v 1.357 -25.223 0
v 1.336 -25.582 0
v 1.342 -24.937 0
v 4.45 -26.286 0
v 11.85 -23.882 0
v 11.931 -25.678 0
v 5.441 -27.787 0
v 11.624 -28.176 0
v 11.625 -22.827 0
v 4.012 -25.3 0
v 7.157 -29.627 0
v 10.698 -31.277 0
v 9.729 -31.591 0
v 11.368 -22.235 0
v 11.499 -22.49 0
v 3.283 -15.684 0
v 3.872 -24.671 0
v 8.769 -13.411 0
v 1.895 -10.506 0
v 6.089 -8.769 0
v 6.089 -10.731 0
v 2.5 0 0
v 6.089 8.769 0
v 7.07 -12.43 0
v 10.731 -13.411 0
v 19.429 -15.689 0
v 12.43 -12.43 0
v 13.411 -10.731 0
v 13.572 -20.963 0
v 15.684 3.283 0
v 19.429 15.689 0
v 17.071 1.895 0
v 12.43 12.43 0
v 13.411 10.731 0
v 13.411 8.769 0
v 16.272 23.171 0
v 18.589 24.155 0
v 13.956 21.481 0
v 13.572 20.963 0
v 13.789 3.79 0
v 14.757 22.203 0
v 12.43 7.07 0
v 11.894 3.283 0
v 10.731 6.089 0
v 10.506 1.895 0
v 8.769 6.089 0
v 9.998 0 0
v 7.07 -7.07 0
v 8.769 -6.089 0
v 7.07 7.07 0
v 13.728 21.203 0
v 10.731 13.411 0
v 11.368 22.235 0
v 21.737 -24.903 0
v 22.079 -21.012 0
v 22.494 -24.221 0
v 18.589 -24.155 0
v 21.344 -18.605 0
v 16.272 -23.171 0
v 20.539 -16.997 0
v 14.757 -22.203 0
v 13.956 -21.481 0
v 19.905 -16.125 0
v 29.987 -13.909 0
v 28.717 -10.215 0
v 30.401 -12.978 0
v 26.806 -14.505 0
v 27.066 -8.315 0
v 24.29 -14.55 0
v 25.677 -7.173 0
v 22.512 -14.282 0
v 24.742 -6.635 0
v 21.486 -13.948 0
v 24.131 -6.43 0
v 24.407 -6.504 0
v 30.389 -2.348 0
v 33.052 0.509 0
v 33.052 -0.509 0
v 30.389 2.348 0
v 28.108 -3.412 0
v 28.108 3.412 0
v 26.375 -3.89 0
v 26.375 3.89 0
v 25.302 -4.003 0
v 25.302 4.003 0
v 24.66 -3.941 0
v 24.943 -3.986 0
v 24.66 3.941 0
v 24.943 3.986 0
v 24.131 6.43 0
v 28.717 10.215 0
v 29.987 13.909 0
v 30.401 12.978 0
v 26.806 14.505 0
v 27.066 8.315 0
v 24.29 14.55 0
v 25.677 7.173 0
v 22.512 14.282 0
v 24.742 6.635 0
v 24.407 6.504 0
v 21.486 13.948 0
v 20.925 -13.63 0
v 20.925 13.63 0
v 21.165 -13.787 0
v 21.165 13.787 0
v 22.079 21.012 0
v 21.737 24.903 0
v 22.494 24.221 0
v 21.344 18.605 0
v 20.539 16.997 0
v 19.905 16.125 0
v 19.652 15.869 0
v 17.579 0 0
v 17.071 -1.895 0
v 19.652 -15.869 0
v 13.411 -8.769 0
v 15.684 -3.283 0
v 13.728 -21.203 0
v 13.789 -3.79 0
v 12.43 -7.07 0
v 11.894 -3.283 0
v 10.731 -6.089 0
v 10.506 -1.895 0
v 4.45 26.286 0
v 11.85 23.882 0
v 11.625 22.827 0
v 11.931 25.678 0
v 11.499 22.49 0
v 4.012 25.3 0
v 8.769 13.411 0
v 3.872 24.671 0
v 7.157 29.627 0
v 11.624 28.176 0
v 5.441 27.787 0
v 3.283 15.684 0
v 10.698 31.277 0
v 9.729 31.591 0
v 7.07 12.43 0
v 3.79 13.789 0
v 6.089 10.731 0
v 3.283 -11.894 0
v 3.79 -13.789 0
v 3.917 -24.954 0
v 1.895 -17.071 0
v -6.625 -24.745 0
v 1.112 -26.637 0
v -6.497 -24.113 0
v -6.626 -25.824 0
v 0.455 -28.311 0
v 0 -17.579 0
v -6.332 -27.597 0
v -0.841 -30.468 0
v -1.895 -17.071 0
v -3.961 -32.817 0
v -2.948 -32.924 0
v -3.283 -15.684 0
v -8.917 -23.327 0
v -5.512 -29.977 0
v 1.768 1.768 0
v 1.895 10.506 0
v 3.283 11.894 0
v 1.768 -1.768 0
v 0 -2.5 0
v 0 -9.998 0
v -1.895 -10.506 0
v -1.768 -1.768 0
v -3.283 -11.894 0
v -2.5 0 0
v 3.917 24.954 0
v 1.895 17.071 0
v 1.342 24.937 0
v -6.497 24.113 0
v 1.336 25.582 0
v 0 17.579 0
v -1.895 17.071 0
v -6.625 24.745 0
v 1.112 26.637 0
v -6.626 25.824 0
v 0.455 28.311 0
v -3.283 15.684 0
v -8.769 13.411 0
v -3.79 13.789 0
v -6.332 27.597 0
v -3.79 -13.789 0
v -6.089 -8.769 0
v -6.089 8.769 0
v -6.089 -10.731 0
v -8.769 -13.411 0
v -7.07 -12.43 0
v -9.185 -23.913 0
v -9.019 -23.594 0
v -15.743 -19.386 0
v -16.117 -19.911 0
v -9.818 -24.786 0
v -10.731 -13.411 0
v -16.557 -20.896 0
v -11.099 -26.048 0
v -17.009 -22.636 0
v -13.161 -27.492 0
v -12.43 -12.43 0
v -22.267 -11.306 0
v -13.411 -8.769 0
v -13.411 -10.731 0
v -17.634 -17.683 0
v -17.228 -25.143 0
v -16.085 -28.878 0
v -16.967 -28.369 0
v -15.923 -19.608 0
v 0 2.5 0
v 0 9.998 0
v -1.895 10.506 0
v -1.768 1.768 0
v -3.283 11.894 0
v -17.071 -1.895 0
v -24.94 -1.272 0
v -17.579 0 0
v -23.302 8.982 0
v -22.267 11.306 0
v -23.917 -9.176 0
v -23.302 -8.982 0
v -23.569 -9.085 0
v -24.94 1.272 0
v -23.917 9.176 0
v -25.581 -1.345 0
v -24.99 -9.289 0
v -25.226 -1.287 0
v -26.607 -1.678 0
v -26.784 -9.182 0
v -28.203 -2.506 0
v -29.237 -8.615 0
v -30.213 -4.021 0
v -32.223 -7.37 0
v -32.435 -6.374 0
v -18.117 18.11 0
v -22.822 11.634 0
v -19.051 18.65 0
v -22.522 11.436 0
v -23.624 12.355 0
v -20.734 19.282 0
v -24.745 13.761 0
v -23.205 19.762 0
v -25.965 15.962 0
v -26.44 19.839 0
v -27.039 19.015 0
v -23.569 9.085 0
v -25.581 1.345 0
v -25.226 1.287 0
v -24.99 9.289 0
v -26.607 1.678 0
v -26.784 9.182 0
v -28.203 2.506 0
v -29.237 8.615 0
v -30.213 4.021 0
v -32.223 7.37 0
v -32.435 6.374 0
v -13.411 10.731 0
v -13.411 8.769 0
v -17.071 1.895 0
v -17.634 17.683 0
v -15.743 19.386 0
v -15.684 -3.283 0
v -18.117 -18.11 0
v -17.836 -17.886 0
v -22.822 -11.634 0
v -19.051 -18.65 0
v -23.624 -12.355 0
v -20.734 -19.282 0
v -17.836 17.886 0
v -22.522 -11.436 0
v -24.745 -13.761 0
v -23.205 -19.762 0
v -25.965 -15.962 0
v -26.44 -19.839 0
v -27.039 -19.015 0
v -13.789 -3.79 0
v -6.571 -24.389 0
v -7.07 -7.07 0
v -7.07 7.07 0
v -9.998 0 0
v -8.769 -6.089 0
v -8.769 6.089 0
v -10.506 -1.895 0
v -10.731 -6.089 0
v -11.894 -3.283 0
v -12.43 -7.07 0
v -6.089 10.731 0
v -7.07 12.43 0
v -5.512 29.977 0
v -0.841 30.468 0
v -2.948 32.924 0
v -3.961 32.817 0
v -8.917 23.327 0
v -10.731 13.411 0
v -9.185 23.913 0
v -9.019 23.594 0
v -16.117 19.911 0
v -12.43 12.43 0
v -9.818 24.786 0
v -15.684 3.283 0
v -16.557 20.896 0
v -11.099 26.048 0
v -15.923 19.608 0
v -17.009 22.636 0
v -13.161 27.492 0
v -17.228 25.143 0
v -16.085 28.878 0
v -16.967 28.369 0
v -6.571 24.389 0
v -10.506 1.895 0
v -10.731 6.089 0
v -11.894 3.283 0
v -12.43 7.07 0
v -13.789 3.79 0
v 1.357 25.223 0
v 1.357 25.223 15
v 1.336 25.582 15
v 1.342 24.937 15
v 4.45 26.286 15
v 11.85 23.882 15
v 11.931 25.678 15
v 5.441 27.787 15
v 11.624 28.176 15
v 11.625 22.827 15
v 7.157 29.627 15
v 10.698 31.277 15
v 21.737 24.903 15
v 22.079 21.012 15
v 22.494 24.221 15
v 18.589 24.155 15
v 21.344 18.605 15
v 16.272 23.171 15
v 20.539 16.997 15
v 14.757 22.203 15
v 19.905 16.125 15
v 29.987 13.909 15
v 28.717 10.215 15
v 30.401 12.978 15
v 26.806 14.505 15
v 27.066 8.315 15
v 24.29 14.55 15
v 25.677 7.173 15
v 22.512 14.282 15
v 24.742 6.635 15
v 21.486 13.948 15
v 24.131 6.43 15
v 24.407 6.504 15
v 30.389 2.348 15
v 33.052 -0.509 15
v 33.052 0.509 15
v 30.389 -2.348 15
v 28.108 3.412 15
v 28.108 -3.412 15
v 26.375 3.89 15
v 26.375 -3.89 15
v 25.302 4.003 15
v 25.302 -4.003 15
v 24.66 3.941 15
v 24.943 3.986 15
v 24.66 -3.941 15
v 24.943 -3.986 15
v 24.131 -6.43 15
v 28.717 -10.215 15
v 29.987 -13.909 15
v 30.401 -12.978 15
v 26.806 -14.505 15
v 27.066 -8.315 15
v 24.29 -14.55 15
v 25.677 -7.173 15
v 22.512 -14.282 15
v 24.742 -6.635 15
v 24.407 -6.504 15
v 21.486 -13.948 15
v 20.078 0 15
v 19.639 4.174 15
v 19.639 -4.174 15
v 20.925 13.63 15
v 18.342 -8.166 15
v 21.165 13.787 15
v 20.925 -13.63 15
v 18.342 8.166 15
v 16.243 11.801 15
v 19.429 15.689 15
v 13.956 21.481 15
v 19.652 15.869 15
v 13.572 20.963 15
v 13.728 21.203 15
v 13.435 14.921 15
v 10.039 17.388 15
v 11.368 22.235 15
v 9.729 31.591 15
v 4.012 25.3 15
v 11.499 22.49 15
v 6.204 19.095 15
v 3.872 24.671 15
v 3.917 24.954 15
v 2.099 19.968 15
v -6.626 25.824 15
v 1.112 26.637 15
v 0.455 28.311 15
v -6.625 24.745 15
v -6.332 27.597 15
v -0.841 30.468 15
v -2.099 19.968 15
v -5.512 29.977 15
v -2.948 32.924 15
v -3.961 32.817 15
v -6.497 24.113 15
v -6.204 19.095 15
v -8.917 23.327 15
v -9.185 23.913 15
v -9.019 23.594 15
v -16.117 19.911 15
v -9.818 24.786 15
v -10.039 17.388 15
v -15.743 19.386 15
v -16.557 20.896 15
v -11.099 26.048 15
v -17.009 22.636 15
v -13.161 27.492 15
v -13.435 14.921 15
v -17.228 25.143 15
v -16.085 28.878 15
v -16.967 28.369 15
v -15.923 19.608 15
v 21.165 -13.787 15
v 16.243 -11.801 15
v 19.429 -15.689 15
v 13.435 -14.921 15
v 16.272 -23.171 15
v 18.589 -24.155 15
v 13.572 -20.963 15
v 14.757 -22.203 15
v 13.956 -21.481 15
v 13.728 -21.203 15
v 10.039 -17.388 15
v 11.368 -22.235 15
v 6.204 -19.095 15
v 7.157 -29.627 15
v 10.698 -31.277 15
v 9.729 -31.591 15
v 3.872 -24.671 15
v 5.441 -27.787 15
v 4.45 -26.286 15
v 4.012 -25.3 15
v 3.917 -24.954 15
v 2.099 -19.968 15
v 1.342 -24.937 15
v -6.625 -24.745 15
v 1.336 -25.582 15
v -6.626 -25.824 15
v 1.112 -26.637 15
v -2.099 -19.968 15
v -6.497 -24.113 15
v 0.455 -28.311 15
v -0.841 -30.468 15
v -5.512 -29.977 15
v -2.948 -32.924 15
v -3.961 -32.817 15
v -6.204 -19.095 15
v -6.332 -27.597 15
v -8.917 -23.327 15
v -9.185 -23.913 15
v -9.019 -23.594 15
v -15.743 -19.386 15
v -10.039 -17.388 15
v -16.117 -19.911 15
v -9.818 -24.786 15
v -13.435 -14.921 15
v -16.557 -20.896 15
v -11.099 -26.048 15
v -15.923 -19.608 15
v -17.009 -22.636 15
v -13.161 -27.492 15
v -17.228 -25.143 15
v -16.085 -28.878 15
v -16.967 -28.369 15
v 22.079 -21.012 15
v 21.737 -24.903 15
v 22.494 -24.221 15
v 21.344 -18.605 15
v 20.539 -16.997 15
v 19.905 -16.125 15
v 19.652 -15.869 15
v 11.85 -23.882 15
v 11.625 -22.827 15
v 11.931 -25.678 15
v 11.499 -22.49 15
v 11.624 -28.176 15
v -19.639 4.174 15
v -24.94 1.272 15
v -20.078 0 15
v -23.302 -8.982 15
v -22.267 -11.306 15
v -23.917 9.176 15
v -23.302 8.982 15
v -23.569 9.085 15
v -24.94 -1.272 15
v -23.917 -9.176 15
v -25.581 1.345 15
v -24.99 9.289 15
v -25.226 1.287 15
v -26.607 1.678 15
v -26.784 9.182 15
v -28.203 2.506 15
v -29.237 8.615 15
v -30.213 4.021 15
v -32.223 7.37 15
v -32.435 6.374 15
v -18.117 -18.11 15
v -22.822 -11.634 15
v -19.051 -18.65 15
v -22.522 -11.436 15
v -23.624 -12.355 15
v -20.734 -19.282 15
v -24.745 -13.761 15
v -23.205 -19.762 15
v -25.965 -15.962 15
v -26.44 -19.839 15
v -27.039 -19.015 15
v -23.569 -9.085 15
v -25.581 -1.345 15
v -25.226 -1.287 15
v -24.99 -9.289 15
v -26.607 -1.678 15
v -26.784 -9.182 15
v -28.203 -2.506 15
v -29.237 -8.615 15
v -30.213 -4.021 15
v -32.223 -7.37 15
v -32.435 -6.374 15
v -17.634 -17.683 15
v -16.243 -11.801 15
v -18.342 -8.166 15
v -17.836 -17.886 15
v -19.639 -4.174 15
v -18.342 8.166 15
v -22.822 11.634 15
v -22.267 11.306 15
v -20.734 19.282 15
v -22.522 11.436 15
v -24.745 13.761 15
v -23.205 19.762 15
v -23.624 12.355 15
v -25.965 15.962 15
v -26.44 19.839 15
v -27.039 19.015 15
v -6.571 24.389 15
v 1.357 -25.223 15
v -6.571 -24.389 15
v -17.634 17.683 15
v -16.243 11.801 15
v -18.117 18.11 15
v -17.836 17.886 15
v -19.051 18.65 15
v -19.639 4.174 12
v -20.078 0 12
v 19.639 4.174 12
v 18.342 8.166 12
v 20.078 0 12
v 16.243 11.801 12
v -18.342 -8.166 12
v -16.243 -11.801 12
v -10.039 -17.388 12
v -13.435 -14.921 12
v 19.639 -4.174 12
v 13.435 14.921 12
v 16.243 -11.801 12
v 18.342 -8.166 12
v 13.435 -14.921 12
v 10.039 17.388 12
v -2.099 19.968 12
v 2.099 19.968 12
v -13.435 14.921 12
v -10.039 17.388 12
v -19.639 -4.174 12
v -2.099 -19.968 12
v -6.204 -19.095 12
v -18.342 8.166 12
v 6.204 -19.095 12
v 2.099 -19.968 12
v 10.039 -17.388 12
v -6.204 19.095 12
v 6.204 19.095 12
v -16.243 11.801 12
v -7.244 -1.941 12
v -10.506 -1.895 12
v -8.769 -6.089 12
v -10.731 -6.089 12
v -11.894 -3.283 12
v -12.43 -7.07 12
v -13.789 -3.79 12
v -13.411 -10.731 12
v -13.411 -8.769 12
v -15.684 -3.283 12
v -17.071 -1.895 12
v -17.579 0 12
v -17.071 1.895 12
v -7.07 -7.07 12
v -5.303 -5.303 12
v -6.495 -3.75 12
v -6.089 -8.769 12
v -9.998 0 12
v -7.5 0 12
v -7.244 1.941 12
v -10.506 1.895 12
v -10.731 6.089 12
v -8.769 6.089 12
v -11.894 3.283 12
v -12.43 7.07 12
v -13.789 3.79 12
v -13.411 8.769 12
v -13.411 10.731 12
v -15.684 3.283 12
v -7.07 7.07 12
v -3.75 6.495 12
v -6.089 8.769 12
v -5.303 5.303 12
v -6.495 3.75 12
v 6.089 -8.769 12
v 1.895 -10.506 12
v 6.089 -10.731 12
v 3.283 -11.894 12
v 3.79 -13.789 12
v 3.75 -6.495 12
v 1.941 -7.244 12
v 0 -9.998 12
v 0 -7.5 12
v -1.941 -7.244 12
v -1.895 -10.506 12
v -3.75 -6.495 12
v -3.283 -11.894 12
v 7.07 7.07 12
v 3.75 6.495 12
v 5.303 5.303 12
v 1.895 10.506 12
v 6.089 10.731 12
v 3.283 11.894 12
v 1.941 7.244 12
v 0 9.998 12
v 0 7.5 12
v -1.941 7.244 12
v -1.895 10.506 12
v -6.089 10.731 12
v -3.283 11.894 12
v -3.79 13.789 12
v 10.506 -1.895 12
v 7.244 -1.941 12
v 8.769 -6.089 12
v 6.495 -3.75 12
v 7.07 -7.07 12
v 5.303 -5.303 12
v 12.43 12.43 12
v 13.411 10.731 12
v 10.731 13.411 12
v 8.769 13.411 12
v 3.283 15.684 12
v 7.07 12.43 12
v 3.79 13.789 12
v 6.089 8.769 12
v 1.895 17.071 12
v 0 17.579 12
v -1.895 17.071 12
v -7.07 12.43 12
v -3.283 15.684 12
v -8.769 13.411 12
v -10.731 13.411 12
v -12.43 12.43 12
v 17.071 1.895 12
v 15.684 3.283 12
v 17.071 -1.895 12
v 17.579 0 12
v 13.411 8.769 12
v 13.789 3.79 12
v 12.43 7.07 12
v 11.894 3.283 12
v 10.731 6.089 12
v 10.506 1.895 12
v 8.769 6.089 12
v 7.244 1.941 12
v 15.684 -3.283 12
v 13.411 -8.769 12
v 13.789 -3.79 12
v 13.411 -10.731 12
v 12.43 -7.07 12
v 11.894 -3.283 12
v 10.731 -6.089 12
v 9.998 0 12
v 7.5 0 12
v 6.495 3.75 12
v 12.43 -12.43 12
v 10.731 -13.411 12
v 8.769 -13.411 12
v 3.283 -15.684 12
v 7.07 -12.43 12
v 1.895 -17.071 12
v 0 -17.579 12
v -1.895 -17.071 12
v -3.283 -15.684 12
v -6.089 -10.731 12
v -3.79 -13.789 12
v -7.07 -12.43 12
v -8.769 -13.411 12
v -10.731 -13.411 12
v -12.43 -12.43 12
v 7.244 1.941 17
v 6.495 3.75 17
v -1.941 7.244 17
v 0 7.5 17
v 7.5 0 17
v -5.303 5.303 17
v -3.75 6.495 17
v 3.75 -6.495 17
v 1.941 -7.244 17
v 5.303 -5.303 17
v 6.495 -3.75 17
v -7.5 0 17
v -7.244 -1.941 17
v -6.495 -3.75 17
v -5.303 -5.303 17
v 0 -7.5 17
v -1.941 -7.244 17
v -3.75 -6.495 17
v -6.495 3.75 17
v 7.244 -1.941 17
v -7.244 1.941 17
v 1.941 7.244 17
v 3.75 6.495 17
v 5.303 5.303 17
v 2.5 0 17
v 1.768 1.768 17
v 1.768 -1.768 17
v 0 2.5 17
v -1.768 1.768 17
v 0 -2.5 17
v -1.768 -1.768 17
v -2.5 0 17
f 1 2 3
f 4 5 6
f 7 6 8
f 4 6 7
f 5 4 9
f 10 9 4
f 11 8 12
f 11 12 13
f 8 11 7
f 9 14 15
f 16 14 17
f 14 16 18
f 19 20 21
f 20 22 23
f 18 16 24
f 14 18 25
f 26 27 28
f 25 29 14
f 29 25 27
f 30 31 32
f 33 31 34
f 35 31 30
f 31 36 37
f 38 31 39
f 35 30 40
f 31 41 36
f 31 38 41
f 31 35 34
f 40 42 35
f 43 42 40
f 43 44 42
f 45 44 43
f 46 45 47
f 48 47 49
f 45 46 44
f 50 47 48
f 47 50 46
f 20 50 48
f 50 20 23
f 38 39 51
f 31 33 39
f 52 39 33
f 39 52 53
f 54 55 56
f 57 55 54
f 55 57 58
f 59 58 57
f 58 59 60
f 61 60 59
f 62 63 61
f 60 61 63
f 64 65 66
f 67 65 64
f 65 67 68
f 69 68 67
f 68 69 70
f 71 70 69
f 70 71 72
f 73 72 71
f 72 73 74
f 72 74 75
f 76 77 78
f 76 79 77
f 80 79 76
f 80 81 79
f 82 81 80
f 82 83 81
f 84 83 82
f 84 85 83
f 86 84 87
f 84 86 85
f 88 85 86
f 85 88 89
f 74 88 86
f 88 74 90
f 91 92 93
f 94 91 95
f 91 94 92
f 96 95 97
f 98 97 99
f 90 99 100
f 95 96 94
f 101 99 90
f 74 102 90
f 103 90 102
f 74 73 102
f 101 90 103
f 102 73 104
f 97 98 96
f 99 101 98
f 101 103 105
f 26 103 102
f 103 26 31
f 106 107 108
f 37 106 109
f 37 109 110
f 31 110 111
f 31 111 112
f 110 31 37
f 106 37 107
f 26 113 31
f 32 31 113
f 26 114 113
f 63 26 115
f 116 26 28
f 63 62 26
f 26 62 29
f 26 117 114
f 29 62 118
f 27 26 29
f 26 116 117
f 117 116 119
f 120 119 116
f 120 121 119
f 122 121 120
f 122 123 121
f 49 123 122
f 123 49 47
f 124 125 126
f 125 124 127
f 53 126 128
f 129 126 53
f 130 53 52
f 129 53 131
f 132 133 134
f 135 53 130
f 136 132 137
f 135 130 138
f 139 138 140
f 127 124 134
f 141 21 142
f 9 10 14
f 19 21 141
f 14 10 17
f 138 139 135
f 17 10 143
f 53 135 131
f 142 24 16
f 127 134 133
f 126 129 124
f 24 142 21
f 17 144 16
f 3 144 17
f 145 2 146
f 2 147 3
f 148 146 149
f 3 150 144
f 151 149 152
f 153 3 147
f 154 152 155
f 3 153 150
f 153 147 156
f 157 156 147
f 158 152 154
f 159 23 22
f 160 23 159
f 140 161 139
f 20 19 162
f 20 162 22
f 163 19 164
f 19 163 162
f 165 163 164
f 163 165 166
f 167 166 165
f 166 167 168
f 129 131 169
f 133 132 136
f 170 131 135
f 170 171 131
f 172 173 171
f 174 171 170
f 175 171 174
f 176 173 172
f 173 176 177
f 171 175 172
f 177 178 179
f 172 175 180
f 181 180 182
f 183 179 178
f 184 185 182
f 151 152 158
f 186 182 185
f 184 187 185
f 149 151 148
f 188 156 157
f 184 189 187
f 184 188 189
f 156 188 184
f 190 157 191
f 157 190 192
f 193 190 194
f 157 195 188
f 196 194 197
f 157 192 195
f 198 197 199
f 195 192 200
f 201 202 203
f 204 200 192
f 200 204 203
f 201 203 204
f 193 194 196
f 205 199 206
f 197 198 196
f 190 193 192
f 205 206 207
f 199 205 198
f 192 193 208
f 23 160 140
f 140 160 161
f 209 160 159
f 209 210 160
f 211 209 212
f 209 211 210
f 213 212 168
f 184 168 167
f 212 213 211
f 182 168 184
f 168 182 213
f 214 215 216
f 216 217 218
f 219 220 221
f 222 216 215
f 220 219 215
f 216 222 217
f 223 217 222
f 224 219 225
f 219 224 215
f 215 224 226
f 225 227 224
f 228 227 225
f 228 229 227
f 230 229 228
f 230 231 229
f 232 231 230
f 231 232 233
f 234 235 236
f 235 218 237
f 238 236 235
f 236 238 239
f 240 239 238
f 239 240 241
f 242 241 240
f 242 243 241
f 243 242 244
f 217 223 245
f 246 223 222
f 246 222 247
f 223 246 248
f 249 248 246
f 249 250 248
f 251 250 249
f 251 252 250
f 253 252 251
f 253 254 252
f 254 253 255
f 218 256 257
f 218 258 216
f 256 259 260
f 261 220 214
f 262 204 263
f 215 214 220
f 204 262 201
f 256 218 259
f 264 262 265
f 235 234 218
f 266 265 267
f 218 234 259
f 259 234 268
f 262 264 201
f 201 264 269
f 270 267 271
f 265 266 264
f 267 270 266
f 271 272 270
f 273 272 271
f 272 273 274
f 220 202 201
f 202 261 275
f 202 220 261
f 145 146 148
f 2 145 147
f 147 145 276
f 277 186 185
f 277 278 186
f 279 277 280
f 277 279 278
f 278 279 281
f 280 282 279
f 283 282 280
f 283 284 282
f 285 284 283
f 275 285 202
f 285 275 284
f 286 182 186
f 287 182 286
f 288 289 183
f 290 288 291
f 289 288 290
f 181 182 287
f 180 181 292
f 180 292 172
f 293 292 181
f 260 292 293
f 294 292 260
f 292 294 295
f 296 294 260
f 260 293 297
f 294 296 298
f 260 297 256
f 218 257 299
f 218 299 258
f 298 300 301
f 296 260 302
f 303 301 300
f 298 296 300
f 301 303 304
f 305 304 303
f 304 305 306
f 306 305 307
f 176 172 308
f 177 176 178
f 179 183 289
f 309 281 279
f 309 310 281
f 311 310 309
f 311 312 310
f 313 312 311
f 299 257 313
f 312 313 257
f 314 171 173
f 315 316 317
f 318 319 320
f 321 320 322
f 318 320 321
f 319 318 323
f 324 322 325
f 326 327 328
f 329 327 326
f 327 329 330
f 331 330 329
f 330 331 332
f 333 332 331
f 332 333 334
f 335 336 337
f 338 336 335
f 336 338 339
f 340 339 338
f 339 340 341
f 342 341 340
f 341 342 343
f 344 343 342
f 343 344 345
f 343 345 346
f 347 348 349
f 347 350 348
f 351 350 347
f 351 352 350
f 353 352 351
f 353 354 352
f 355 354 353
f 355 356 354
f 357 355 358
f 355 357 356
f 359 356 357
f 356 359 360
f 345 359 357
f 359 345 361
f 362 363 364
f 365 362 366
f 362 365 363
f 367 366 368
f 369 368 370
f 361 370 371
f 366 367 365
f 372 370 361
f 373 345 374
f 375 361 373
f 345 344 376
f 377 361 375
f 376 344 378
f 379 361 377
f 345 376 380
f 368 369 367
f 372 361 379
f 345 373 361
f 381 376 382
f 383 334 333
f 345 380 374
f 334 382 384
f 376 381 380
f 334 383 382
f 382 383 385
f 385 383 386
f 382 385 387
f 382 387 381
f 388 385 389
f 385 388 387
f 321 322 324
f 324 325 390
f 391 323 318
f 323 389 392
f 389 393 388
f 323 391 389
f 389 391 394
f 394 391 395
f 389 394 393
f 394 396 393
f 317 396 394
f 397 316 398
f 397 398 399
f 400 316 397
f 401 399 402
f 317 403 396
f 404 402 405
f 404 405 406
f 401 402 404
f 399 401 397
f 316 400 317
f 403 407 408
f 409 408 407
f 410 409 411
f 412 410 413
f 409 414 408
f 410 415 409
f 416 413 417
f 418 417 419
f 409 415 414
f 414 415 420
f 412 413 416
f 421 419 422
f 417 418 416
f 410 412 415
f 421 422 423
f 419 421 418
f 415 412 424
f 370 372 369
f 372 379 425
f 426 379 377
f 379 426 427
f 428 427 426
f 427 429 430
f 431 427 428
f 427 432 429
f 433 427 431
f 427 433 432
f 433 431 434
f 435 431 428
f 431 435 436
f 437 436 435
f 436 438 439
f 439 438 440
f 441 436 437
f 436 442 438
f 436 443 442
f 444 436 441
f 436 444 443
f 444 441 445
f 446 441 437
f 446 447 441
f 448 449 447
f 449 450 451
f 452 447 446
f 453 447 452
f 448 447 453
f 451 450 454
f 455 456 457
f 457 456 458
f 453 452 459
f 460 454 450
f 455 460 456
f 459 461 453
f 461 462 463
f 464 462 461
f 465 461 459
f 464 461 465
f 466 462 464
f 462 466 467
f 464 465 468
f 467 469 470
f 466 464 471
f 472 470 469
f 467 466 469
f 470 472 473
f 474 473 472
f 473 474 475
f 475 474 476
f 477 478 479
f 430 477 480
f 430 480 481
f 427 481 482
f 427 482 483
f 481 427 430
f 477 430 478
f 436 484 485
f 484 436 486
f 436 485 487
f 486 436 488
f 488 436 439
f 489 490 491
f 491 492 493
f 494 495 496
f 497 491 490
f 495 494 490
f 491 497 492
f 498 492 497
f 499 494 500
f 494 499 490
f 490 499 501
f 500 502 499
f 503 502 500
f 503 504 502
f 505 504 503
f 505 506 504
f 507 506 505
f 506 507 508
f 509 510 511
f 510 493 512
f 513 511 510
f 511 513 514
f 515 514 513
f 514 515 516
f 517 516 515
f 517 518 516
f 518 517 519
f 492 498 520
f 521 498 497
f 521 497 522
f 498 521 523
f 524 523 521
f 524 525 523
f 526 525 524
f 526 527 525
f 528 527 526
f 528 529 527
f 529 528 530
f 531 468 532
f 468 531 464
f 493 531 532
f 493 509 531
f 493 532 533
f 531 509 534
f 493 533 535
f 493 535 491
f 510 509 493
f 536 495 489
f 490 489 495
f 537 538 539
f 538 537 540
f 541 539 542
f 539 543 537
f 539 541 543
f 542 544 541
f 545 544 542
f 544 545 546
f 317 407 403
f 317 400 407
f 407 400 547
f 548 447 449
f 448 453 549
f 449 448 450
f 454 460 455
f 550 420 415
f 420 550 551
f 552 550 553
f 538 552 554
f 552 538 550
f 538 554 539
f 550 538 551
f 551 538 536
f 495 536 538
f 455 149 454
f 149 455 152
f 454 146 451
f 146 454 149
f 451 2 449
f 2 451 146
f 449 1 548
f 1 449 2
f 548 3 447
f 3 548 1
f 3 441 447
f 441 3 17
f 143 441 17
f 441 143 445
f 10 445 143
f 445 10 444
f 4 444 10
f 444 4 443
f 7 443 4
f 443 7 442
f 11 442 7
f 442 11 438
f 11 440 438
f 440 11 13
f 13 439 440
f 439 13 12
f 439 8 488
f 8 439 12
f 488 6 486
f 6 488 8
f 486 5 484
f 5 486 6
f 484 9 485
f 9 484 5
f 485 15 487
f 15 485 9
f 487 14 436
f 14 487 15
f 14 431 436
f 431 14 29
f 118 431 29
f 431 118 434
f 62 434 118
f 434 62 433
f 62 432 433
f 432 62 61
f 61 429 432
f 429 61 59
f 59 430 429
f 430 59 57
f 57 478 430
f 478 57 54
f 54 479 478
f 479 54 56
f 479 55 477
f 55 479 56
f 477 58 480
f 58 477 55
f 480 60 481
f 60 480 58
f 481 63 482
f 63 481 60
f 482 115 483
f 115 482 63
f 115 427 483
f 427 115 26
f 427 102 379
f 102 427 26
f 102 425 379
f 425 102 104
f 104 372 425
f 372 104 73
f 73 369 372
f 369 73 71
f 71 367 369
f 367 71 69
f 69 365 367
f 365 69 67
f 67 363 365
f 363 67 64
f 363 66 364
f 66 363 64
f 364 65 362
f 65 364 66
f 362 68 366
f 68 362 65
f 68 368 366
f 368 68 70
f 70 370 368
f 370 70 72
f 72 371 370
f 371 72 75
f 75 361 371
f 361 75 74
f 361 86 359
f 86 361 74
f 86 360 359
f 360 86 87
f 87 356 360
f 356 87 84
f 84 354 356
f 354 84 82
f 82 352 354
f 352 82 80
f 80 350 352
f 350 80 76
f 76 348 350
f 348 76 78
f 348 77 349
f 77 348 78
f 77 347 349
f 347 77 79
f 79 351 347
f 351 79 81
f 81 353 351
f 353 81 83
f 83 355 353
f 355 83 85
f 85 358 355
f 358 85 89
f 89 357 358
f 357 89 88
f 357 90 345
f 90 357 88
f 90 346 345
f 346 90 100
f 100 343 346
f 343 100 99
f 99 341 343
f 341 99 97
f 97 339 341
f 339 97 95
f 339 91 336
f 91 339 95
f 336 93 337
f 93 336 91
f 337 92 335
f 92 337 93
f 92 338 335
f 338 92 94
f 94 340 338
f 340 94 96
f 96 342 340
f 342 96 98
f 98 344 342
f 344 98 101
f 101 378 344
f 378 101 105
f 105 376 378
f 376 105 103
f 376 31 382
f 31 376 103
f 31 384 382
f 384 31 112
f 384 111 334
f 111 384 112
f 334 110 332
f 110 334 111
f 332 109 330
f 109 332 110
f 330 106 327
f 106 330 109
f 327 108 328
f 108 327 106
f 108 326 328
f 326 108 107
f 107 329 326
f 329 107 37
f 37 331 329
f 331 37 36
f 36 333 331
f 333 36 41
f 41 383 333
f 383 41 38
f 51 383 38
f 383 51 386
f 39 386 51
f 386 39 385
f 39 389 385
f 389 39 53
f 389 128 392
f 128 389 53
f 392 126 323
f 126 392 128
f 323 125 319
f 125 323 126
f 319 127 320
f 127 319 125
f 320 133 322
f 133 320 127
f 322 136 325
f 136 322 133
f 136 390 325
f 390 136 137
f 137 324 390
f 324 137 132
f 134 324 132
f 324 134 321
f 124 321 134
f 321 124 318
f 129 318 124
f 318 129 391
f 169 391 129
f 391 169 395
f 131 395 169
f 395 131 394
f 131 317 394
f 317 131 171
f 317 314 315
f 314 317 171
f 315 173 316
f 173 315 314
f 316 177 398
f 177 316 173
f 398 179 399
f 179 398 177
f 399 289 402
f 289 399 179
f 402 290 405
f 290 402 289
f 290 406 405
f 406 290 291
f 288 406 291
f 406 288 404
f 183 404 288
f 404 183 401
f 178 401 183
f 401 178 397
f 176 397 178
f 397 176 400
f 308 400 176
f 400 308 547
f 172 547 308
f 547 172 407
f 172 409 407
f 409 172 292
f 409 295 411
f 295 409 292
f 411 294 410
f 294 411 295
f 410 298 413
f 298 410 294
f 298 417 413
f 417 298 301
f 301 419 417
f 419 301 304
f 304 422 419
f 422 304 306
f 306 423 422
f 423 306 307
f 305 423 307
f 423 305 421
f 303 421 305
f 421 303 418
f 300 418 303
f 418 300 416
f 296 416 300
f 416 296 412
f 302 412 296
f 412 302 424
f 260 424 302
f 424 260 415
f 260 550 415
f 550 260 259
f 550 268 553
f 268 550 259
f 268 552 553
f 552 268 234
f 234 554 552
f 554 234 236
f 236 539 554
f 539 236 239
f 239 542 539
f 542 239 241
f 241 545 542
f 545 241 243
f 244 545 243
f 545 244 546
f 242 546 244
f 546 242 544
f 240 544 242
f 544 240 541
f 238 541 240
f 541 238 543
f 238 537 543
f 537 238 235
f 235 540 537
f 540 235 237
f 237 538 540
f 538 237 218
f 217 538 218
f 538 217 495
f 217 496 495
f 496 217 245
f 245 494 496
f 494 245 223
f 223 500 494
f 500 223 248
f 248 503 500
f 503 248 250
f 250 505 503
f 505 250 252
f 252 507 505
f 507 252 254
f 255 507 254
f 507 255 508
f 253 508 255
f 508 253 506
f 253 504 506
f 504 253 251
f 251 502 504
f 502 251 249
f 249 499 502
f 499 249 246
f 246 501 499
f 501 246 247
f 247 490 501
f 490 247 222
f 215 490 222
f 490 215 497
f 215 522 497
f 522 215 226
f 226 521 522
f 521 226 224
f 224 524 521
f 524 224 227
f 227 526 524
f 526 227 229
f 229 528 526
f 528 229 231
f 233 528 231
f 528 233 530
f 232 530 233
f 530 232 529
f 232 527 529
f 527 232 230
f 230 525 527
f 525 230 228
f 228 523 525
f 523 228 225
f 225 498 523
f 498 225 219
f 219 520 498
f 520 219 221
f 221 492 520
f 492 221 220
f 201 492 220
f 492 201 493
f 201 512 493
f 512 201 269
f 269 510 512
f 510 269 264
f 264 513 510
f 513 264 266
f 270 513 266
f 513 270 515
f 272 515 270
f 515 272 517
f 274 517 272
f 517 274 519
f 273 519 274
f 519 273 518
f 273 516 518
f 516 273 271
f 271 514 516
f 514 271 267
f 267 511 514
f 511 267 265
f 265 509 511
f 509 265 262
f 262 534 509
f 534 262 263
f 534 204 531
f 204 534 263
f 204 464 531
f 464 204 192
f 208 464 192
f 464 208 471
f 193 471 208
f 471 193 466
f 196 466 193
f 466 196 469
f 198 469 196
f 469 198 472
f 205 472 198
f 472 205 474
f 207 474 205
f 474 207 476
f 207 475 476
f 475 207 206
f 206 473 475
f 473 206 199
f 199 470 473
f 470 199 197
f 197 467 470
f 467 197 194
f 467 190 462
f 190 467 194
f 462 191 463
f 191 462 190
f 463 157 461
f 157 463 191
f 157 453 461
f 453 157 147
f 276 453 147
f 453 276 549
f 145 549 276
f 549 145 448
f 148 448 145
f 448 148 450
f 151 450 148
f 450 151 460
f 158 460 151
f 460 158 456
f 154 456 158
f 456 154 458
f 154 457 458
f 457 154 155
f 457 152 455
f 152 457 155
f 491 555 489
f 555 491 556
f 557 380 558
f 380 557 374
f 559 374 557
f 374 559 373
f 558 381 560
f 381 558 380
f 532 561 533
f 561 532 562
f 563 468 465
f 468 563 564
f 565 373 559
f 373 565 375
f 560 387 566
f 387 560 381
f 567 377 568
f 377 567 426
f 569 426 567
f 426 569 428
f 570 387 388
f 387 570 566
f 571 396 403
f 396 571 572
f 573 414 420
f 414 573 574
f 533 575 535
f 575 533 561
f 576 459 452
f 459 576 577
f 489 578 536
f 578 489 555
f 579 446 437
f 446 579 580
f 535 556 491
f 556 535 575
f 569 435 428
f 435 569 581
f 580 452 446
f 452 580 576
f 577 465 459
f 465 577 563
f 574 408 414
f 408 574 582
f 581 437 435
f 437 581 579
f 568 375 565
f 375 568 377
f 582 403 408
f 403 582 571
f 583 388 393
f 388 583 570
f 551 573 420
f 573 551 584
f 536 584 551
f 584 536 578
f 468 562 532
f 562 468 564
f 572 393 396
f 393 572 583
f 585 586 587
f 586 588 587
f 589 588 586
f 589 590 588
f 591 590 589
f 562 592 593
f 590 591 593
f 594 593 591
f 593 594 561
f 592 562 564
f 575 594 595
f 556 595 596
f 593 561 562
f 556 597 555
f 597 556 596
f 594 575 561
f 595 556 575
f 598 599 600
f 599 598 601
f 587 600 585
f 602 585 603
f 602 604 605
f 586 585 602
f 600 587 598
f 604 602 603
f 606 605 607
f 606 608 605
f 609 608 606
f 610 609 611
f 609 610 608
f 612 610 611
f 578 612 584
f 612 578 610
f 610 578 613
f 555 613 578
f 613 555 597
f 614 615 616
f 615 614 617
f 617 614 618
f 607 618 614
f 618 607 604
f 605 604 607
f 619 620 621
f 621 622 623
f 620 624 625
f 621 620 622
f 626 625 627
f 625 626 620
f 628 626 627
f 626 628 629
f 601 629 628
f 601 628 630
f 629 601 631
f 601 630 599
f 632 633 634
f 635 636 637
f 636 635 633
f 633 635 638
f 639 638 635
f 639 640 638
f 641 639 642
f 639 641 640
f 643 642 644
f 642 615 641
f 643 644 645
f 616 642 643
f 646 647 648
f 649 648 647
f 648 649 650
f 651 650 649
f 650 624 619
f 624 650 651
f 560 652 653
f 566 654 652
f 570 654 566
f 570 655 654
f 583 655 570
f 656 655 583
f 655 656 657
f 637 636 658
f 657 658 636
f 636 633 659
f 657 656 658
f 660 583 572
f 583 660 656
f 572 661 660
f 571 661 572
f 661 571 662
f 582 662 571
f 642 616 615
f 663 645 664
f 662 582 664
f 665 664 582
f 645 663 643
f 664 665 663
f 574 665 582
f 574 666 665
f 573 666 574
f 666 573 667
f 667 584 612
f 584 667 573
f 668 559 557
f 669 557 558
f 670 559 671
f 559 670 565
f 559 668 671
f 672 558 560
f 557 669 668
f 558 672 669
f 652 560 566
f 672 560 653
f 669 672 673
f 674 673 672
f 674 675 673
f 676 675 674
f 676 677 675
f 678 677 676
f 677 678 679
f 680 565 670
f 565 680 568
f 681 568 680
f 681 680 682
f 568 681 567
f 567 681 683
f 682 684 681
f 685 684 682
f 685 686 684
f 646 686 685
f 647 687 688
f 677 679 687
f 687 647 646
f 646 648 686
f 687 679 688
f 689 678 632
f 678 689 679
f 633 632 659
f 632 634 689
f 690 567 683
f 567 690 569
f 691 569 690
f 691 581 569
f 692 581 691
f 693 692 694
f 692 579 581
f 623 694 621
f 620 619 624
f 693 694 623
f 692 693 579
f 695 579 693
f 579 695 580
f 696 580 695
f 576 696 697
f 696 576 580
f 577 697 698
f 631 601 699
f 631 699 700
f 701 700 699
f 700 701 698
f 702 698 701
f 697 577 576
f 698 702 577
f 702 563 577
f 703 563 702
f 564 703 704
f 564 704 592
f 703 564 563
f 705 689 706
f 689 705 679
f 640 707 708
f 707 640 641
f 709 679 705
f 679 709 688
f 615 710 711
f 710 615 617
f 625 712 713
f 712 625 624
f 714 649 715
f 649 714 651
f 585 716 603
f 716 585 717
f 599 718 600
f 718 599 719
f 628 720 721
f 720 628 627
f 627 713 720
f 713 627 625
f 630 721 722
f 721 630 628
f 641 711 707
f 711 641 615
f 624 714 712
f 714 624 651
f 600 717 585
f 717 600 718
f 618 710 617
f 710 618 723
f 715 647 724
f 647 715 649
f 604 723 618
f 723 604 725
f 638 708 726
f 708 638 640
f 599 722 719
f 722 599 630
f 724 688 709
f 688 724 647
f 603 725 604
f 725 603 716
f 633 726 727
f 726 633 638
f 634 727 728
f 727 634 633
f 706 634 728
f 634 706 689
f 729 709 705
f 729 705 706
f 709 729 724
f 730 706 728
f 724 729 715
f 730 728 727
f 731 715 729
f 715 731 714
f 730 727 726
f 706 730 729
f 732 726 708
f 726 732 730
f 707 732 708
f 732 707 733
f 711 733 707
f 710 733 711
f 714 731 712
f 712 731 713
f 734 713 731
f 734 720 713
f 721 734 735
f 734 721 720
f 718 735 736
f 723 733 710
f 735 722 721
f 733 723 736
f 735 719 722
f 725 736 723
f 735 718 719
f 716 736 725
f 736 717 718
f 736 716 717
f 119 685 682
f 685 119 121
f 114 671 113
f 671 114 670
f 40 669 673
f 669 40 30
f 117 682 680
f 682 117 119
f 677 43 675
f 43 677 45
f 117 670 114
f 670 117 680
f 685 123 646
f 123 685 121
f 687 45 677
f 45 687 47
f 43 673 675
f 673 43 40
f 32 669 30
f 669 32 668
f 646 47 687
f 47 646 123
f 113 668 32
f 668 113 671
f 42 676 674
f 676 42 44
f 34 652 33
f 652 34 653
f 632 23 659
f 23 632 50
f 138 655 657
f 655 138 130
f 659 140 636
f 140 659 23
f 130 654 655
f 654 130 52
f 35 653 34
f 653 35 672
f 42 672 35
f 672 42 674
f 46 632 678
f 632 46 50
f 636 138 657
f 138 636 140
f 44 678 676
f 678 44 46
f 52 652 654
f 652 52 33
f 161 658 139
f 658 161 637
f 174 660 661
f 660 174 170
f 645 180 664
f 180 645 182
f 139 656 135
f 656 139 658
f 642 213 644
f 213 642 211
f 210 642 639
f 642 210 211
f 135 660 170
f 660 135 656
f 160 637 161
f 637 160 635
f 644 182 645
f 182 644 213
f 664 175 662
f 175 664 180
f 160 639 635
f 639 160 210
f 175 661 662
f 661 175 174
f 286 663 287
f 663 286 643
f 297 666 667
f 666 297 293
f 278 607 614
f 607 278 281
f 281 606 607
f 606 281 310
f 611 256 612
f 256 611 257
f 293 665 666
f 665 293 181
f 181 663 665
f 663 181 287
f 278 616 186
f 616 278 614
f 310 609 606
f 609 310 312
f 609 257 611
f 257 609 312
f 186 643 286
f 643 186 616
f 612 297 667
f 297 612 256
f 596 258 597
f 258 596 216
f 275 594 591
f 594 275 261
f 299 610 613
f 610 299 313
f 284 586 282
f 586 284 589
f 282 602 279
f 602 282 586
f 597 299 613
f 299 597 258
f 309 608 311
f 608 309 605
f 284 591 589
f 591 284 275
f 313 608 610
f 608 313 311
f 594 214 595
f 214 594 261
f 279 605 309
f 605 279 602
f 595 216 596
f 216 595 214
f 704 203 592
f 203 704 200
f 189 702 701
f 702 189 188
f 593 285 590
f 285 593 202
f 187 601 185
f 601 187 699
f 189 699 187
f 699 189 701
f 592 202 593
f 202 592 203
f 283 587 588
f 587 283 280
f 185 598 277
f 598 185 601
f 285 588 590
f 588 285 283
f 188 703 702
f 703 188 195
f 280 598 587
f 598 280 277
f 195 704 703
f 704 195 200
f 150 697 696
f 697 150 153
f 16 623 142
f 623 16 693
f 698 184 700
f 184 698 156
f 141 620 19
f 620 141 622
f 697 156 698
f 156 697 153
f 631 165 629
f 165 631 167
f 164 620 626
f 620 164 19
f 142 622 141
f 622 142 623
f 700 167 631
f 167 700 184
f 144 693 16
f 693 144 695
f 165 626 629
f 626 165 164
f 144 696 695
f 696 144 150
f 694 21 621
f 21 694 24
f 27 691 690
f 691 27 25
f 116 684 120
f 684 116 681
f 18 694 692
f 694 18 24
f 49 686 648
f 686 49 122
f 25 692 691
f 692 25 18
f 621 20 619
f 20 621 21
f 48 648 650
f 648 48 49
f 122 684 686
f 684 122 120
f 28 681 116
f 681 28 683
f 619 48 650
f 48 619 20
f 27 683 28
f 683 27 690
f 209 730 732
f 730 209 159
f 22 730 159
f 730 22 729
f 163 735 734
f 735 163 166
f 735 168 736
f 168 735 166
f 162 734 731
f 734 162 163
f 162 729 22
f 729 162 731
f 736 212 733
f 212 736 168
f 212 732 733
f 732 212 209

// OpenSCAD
// Parametric Involute Bevel and Spur Gears by GregFrost
// It is licensed under the Creative Commons - GNU LGPL 2.1 license.
// © 2010 by GregFrost, thingiverse.com/Amp
//  and http://www.thingiverse.com/thing:3752

// thickness => épaisseur
// pitch => pas
// rim => jante
// bore => perçage

// Simple Test:
gear (circular_pitch=700,
    number_of_teeth=15,
    pressure_angle=30,
    clearance=0.2,
	gear_thickness = 12,
	rim_thickness = 15,
	hub_thickness = 17,
	circles=8);

//Complex Spur Gear Test:
//test_gears ();

// Meshing Double Helix:
//test_meshing_double_helix ();

module test_meshing_double_helix(){
    meshing_double_helix ();
}

// Demonstrate the backlash option for Spur gears.
//test_backlash ();

// Demonstrate how to make meshing bevel gears.
//test_bevel_gear_pair();

module test_bevel_gear_pair(){
    bevel_gear_pair ();
}

module test_bevel_gear(){bevel_gear();}

//bevel_gear();

pi=3.1415926535897932384626433832795;

//==================================================
// Bevel Gears:
// Two gears with the same cone distance, circular pitch (measured at the cone distance)
// and pressure angle will mesh.

module bevel_gear_pair (
	gear1_teeth = 41,
	gear2_teeth = 7,
	axis_angle = 90,
	outside_circular_pitch=1000)
{
	outside_pitch_radius1 = gear1_teeth * outside_circular_pitch / 360;
	outside_pitch_radius2 = gear2_teeth * outside_circular_pitch / 360;
	pitch_apex1=outside_pitch_radius2 * sin (axis_angle) +
		(outside_pitch_radius2 * cos (axis_angle) + outside_pitch_radius1) / tan (axis_angle);
	cone_distance = sqrt (pow (pitch_apex1, 2) + pow (outside_pitch_radius1, 2));
	pitch_apex2 = sqrt (pow (cone_distance, 2) - pow (outside_pitch_radius2, 2));
	echo ("cone_distance", cone_distance);
	pitch_angle1 = asin (outside_pitch_radius1 / cone_distance);
	pitch_angle2 = asin (outside_pitch_radius2 / cone_distance);
	echo ("pitch_angle1, pitch_angle2", pitch_angle1, pitch_angle2);
	echo ("pitch_angle1 + pitch_angle2", pitch_angle1 + pitch_angle2);

	rotate([0,0,90])
	translate ([0,0,pitch_apex1+20])
	{
		translate([0,0,-pitch_apex1])
		bevel_gear (
			number_of_teeth=gear1_teeth,
			cone_distance=cone_distance,
			pressure_angle=30,
			outside_circular_pitch=outside_circular_pitch);

		rotate([0,-(pitch_angle1+pitch_angle2),0])
		translate([0,0,-pitch_apex2])
		bevel_gear (
			number_of_teeth=gear2_teeth,
			cone_distance=cone_distance,
			pressure_angle=30,
			outside_circular_pitch=outside_circular_pitch);
	}
}

//Bevel Gear Finishing Options:
bevel_gear_flat = 0;
bevel_gear_back_cone = 1;

module bevel_gear (
	number_of_teeth=11,
	cone_distance=100,
	face_width=20,
	outside_circular_pitch=1000,
	pressure_angle=30,
	clearance = 0.2,
	bore_diameter=5,
	gear_thickness = 15,
	backlash = 0,
	involute_facets=0,
	finish = -1)
{
	echo ("bevel_gear",
		"teeth", number_of_teeth,
		"cone distance", cone_distance,
		face_width,
		outside_circular_pitch,
		pressure_angle,
		clearance,
		bore_diameter,
		involute_facets,
		finish);

	// Pitch diameter: Diameter of pitch circle at the fat end of the gear.
	outside_pitch_diameter  =  number_of_teeth * outside_circular_pitch / 180;
	outside_pitch_radius = outside_pitch_diameter / 2;

	// The height of the pitch apex.
	pitch_apex = sqrt (pow (cone_distance, 2) - pow (outside_pitch_radius, 2));
	pitch_angle = asin (outside_pitch_radius/cone_distance);

	echo ("Num Teeth:", number_of_teeth, " Pitch Angle:", pitch_angle);

	finish = (finish != -1) ? finish : (pitch_angle < 45) ? bevel_gear_flat : bevel_gear_back_cone;

	apex_to_apex=cone_distance / cos (pitch_angle);
	back_cone_radius = apex_to_apex * sin (pitch_angle);

	// Calculate and display the pitch angle. This is needed to determine the angle to mount two meshing cone gears.

	// Base Circle for forming the involute teeth shape.
	base_radius = back_cone_radius * cos (pressure_angle);

	// Diametrial pitch: Number of teeth per unit length.
	pitch_diametrial = number_of_teeth / outside_pitch_diameter;

	// Addendum: Radial distance from pitch circle to outside circle.
	addendum = 1 / pitch_diametrial;
	// Outer Circle
	outer_radius = back_cone_radius + addendum;

	// Dedendum: Radial distance from pitch circle to root diameter
	dedendum = addendum + clearance;
	dedendum_angle = atan (dedendum / cone_distance);
	root_angle = pitch_angle - dedendum_angle;

	root_cone_full_radius = tan (root_angle)*apex_to_apex;
	back_cone_full_radius=apex_to_apex / tan (pitch_angle);

	back_cone_end_radius =
		outside_pitch_radius -
		dedendum * cos (pitch_angle) -
		gear_thickness / tan (pitch_angle);
	back_cone_descent = dedendum * sin (pitch_angle) + gear_thickness;

	// Root diameter: Diameter of bottom of tooth spaces.
	root_radius = back_cone_radius - dedendum;

	half_tooth_thickness = outside_pitch_radius * sin (360 / (4 * number_of_teeth)) - backlash / 4;
	half_thick_angle = asin (half_tooth_thickness / back_cone_radius);

	face_cone_height = apex_to_apex-face_width / cos (pitch_angle);
	face_cone_full_radius = face_cone_height / tan (pitch_angle);
	face_cone_descent = dedendum * sin (pitch_angle);
	face_cone_end_radius =
		outside_pitch_radius -
		face_width / sin (pitch_angle) -
		face_cone_descent / tan (pitch_angle);

	// For the bevel_gear_flat finish option, calculate the height of a cube to select the portion of the gear that includes the full pitch face.
	bevel_gear_flat_height = pitch_apex - (cone_distance - face_width) * cos (pitch_angle);

//	translate([0,0,-pitch_apex])
	difference ()
	{
		intersection ()
		{
			union()
			{
				rotate (half_thick_angle)
				translate ([0,0,pitch_apex-apex_to_apex])
				cylinder ($fn=number_of_teeth*2, r1=root_cone_full_radius,r2=0,h=apex_to_apex);
				for (i = [1:number_of_teeth])
//				for (i = [1:1])
				{
					rotate ([0,0,i*360/number_of_teeth])
					{
						involute_bevel_gear_tooth (
							back_cone_radius = back_cone_radius,
							root_radius = root_radius,
							base_radius = base_radius,
							outer_radius = outer_radius,
							pitch_apex = pitch_apex,
							cone_distance = cone_distance,
							half_thick_angle = half_thick_angle,
							involute_facets = involute_facets);
					}
				}
			}

			if (finish == bevel_gear_back_cone)
			{
				translate ([0,0,-back_cone_descent])
				cylinder (
					$fn=number_of_teeth*2,
					r1=back_cone_end_radius,
					r2=back_cone_full_radius*2,
					h=apex_to_apex + back_cone_descent);
			}
			else
			{
				translate ([-1.5*outside_pitch_radius,-1.5*outside_pitch_radius,0])
				cube ([3*outside_pitch_radius,
					3*outside_pitch_radius,
					bevel_gear_flat_height]);
			}
		}

		if (finish == bevel_gear_back_cone)
		{
			translate ([0,0,-face_cone_descent])
			cylinder (
				r1=face_cone_end_radius,
				r2=face_cone_full_radius * 2,
				h=face_cone_height + face_cone_descent+pitch_apex);
		}

		translate ([0,0,pitch_apex - apex_to_apex])
		cylinder (r=bore_diameter/2,h=apex_to_apex);
	}
}

module involute_bevel_gear_tooth (
	back_cone_radius,
	root_radius,
	base_radius,
	outer_radius,
	pitch_apex,
	cone_distance,
	half_thick_angle,
	involute_facets)
{
//	echo ("involute_bevel_gear_tooth",
//		back_cone_radius,
//		root_radius,
//		base_radius,
//		outer_radius,
//		pitch_apex,
//		cone_distance,
//		half_thick_angle);

	min_radius = max (base_radius*2,root_radius*2);

	pitch_point =
		involute (
			base_radius*2,
			involute_intersect_angle (base_radius*2, back_cone_radius*2));
	pitch_angle = atan2 (pitch_point[1], pitch_point[0]);
	centre_angle = pitch_angle + half_thick_angle;

	start_angle = involute_intersect_angle (base_radius*2, min_radius);
	stop_angle = involute_intersect_angle (base_radius*2, outer_radius*2);

	res=(involute_facets!=0)?involute_facets:($fn==0)?5:$fn/4;

	translate ([0,0,pitch_apex])
	rotate ([0,-atan(back_cone_radius/cone_distance),0])
	translate ([-back_cone_radius*2,0,-cone_distance*2])
	union ()
	{
		for (i=[1:res])
		{
			assign (
				point1=
					involute (base_radius*2,start_angle+(stop_angle - start_angle)*(i-1)/res),
				point2=
					involute (base_radius*2,start_angle+(stop_angle - start_angle)*(i)/res))
			{
				assign (
					side1_point1 = rotate_point (centre_angle, point1),
					side1_point2 = rotate_point (centre_angle, point2),
					side2_point1 = mirror_point (rotate_point (centre_angle, point1)),
					side2_point2 = mirror_point (rotate_point (centre_angle, point2)))
				{
					polyhedron (
						points=[
							[back_cone_radius*2+0.1,0,cone_distance*2],
							[side1_point1[0],side1_point1[1],0],
							[side1_point2[0],side1_point2[1],0],
							[side2_point2[0],side2_point2[1],0],
							[side2_point1[0],side2_point1[1],0],
							[0.1,0,0]],
						triangles=[[0,2,1],[0,3,2],[0,4,3],[0,1,5],[1,2,5],[2,3,5],[3,4,5],[0,5,4]]);
				}
			}
		}
	}
}

module gear (
	number_of_teeth=15,
	circular_pitch=false, diametral_pitch=false,
	pressure_angle=28,
	clearance = 0.2,
	gear_thickness=5,
	rim_thickness=8,
	rim_width=5,
	hub_thickness=10,
	hub_diameter=15,
	bore_diameter=5,
	circles=0,
	backlash=0,
	twist=0,
	involute_facets=0,
	flat=false)
{
	if (circular_pitch==false && diametral_pitch==false)
		echo("MCAD ERROR: gear module needs either a diametral_pitch or circular_pitch");

	//Convert diametrial pitch to our native circular pitch
	circular_pitch = (circular_pitch!=false?circular_pitch:180/diametral_pitch);

	// Pitch diameter: Diameter of pitch circle.
	pitch_diameter  =  number_of_teeth * circular_pitch / 180;
	pitch_radius = pitch_diameter/2;
	echo ("Teeth:", number_of_teeth, " Pitch radius:", pitch_radius);

	// Base Circle
	base_radius = pitch_radius*cos(pressure_angle);

	// Diametrial pitch: Number of teeth per unit length.
	pitch_diametrial = number_of_teeth / pitch_diameter;

	// Addendum: Radial distance from pitch circle to outside circle.
	addendum = 1/pitch_diametrial;

	//Outer Circle
	outer_radius = pitch_radius+addendum;

	// Dedendum: Radial distance from pitch circle to root diameter
	dedendum = addendum + clearance;

	// Root diameter: Diameter of bottom of tooth spaces.
	root_radius = pitch_radius-dedendum;
	backlash_angle = backlash / pitch_radius * 180 / pi;
	half_thick_angle = (360 / number_of_teeth - backlash_angle) / 4;

	// Variables controlling the rim.
	rim_radius = root_radius - rim_width;

	// Variables controlling the circular holes in the gear.
	circle_orbit_diameter=hub_diameter/2+rim_radius;
	circle_orbit_curcumference=pi*circle_orbit_diameter;

	// Limit the circle size to 90% of the gear face.
	circle_diameter=
		min (
			0.70*circle_orbit_curcumference/circles,
			(rim_radius-hub_diameter/2)*0.9);

	difference()
	{
		union ()
		{
			difference ()
			{
				linear_extrude_flat_option(flat=flat, height=rim_thickness, convexity=10, twist=twist)
				gear_shape (
					number_of_teeth,
					pitch_radius = pitch_radius,
					root_radius = root_radius,
					base_radius = base_radius,
					outer_radius = outer_radius,
					half_thick_angle = half_thick_angle,
					involute_facets=involute_facets);

				if (flat == false && gear_thickness < rim_thickness)
					translate ([0,0,gear_thickness])
					cylinder (r=rim_radius,h=rim_thickness-gear_thickness+1);
			}
			if (gear_thickness > rim_thickness)
				linear_extrude_flat_option(flat=flat, height=gear_thickness)
				circle (r=rim_radius);
			if (flat == false && hub_thickness > gear_thickness)
				translate ([0,0,gear_thickness])
				linear_extrude_flat_option(flat=flat, height=hub_thickness-gear_thickness)
				circle (r=hub_diameter/2);
		}
		translate ([0,0,-1])
		linear_extrude_flat_option(flat =flat, height=2+max(rim_thickness,hub_thickness,gear_thickness))
		circle (r=bore_diameter/2);
		if (circles>0)
		{
			for(i=[0:circles-1])
				rotate([0,0,i*360/circles])
				translate([circle_orbit_diameter/2,0,-1])
				linear_extrude_flat_option(flat =flat, height=max(gear_thickness,rim_thickness)+3)
				circle(r=circle_diameter/2);
		}
	}
}

module rack(
		number_of_teeth=15,
		circular_pitch=false, diametral_pitch=false,
		pressure_angle=28,
		clearance=0.2,
		rim_thickness=8,
		rim_width=5,
		flat=false)
{

	if (circular_pitch==false && diametral_pitch==false)
		echo("MCAD ERROR: gear module needs either a diametral_pitch or circular_pitch");

	//Convert diametrial pitch to our native circular pitch
	circular_pitch = (circular_pitch!=false?circular_pitch:180/diametral_pitch);
	pitch = circular_pitch / 180 * PI;

	addendum = circular_pitch / 180;
	dedendum = addendum + clearance;
	pitch_slope = tan(pressure_angle);

	linear_extrude_flat_option(flat=flat, height=rim_thickness)
		union()
		{
			translate([0,-dedendum-rim_width/2])
				square([number_of_teeth*pitch, rim_width],center=true);

			p1 = pitch / 4 + pitch_slope * dedendum;
			p2 = pitch / 4 - pitch_slope * addendum;
			for(i=[1:number_of_teeth])
				translate([pitch*(i-number_of_teeth/2-0.5),0])
					polygon(points=[
							[-p1,-dedendum],
							[p1,-dedendum],
							[p2,addendum],
							[-p2,addendum]
					]);
		}
}

module linear_extrude_flat_option(flat =false, height = 10, center = false, convexity = 2, twist = 0)
{
	if(flat==false)
	{
		linear_extrude(height = height, center = center, convexity = convexity, twist= twist) children(0);
	}
	else
	{
		children(0);
	}

}

module gear_shape (
	number_of_teeth,
	pitch_radius,
	root_radius,
	base_radius,
	outer_radius,
	half_thick_angle,
	involute_facets)
{
	union()
	{
		rotate (half_thick_angle) circle ($fn=number_of_teeth*2, r=root_radius);

		for (i = [1:number_of_teeth])
		{
			rotate ([0,0,i*360/number_of_teeth])
			{
				involute_gear_tooth (
					pitch_radius = pitch_radius,
					root_radius = root_radius,
					base_radius = base_radius,
					outer_radius = outer_radius,
					half_thick_angle = half_thick_angle,
					involute_facets=involute_facets);
			}
		}
	}
}

module involute_gear_tooth (
	pitch_radius,
	root_radius,
	base_radius,
	outer_radius,
	half_thick_angle,
	involute_facets)
{
	min_radius = max (base_radius,root_radius);

	pitch_point = involute (base_radius, involute_intersect_angle (base_radius, pitch_radius));
	pitch_angle = atan2 (pitch_point[1], pitch_point[0]);
	centre_angle = pitch_angle + half_thick_angle;

	start_angle = involute_intersect_angle (base_radius, min_radius);
	stop_angle = involute_intersect_angle (base_radius, outer_radius);

	res=(involute_facets!=0)?involute_facets:($fn==0)?5:$fn/4;

	union ()
	{
		for (i=[1:res]) {
			point1=involute (base_radius,start_angle+(stop_angle - start_angle)*(i-1)/res);
			point2=involute (base_radius,start_angle+(stop_angle - start_angle)*i/res);
			side1_point1=rotate_point (centre_angle, point1);
			side1_point2=rotate_point (centre_angle, point2);
			side2_point1=mirror_point (rotate_point (centre_angle, point1));
			side2_point2=mirror_point (rotate_point (centre_angle, point2));
			polygon (
				points=[[0,0],side1_point1,side1_point2,side2_point2,side2_point1],
				paths=[[0,1,2,3,4,0]]);
		}
	}
}

// Mathematical Functions
//===============

// Finds the angle of the involute about the base radius at the given distance (radius) from it's center.
//source: http://www.mathhelpforum.com/math-help/geometry/136011-circle-involute-solving-y-any-given-x.html

function involute_intersect_angle (base_radius, radius) = sqrt (pow (radius/base_radius, 2) - 1) * 180 / pi;

// Calculate the involute position for a given base radius and involute angle.

function rotated_involute (rotate, base_radius, involute_angle) =
[
	cos (rotate) * involute (base_radius, involute_angle)[0] + sin (rotate) * involute (base_radius, involute_angle)[1],
	cos (rotate) * involute (base_radius, involute_angle)[1] - sin (rotate) * involute (base_radius, involute_angle)[0]
];

function mirror_point (coord) =
[
	coord[0],
	-coord[1]
];

function rotate_point (rotate, coord) =
[
	cos (rotate) * coord[0] + sin (rotate) * coord[1],
	cos (rotate) * coord[1] - sin (rotate) * coord[0]
];

function involute (base_radius, involute_angle) =
[
	base_radius*(cos (involute_angle) + involute_angle*pi/180*sin (involute_angle)),
	base_radius*(sin (involute_angle) - involute_angle*pi/180*cos (involute_angle))
];


// Test Cases
//===============

module test_gears()
{
	translate([17,-15])
	{
		gear (number_of_teeth=17,
			circular_pitch=500,
			circles=8);

		rotate ([0,0,360*4/17])
		translate ([39.088888,0,0])
		{
			gear (number_of_teeth=11,
				circular_pitch=500,
				hub_diameter=0,
				rim_width=65);
			translate ([0,0,8])
			{
				gear (number_of_teeth=6,
					circular_pitch=300,
					hub_diameter=0,
					rim_width=5,
					rim_thickness=6,
					pressure_angle=31);
				rotate ([0,0,360*5/6])
				translate ([22.5,0,1])
				gear (number_of_teeth=21,
					circular_pitch=300,
					bore_diameter=2,
					hub_diameter=4,
					rim_width=1,
					hub_thickness=4,
					rim_thickness=4,
					gear_thickness=3,
					pressure_angle=31);
			}
		}

		translate ([-61.1111111,0,0])
		{
			gear (number_of_teeth=27,
				circular_pitch=500,
				circles=5,
				hub_diameter=2*8.88888889);

			translate ([-37.5,0,0])
			rotate ([0,0,-90])
			rack (
				circular_pitch=500
			     );

			translate ([0,0,10])
			{
				gear (
					number_of_teeth=14,
					circular_pitch=200,
					pressure_angle=5,
					clearance = 0.2,
					gear_thickness = 10,
					rim_thickness = 10,
					rim_width = 15,
					bore_diameter=5,
					circles=0);
				translate ([13.8888888,0,1])
				gear (
					number_of_teeth=11,
					circular_pitch=200,
					pressure_angle=5,
					clearance = 0.2,
					gear_thickness = 10,
					rim_thickness = 10,
					rim_width = 15,
					hub_thickness = 20,
					hub_diameter=2*7.222222,
					bore_diameter=5,
					circles=0);
			}
		}

		rotate ([0,0,360*-5/17])
		translate ([44.444444444,0,0])
		gear (number_of_teeth=15,
			circular_pitch=500,
			hub_diameter=10,
			rim_width=5,
			rim_thickness=5,
			gear_thickness=4,
			hub_thickness=6,
			circles=9);

		rotate ([0,0,360*-1/17])
		translate ([30.5555555,0,-1])
		gear (number_of_teeth=5,
			circular_pitch=500,
			hub_diameter=0,
			rim_width=5,
			rim_thickness=10);
	}
}

module meshing_double_helix ()
{
	test_double_helix_gear ();

	mirror ([0,1,0])
	translate ([58.33333333,0,0])
	test_double_helix_gear (teeth=13,circles=6);
}

module test_double_helix_gear (
	teeth=17,
	circles=8)
{
	//double helical gear
	{
		twist=200;
		height=20;
		pressure_angle=30;

		gear (number_of_teeth=teeth,
			circular_pitch=700,
			pressure_angle=pressure_angle,
			clearance = 0.2,
			gear_thickness = height/2*0.5,
			rim_thickness = height/2,
			rim_width = 5,
			hub_thickness = height/2*1.2,
			hub_diameter=15,
			bore_diameter=5,
			circles=circles,
			twist=twist/teeth);
		mirror([0,0,1])
		gear (number_of_teeth=teeth,
			circular_pitch=700,
			pressure_angle=pressure_angle,
			clearance = 0.2,
			gear_thickness = height/2,
			rim_thickness = height/2,
			rim_width = 5,
			hub_thickness = height/2,
			hub_diameter=15,
			bore_diameter=5,
			circles=circles,
			twist=twist/teeth);
	}
}

module test_backlash ()
{
	backlash = 2;
	teeth = 15;

	translate ([-29.166666,0,0])
	{
		translate ([58.3333333,0,0])
		rotate ([0,0,-360/teeth/4])
		gear (
			number_of_teeth = teeth,
			circular_pitch=700,
			gear_thickness = 12,
			rim_thickness = 15,
			rim_width = 5,
			hub_thickness = 17,
			hub_diameter=15,
			bore_diameter=5,
			backlash = 2,
			circles=8);

		rotate ([0,0,360/teeth/4])
		gear (
			number_of_teeth = teeth,
			circular_pitch=700,
			gear_thickness = 12,
			rim_thickness = 15,
			rim_width = 5,
			hub_thickness = 17,
			hub_diameter=15,
			bore_diameter=5,
			backlash = 2,
			circles=8);
	}

	color([0,0,128,0.5])
	translate([0,0,-5])
	cylinder ($fn=20,r=backlash / 4,h=25);
}
